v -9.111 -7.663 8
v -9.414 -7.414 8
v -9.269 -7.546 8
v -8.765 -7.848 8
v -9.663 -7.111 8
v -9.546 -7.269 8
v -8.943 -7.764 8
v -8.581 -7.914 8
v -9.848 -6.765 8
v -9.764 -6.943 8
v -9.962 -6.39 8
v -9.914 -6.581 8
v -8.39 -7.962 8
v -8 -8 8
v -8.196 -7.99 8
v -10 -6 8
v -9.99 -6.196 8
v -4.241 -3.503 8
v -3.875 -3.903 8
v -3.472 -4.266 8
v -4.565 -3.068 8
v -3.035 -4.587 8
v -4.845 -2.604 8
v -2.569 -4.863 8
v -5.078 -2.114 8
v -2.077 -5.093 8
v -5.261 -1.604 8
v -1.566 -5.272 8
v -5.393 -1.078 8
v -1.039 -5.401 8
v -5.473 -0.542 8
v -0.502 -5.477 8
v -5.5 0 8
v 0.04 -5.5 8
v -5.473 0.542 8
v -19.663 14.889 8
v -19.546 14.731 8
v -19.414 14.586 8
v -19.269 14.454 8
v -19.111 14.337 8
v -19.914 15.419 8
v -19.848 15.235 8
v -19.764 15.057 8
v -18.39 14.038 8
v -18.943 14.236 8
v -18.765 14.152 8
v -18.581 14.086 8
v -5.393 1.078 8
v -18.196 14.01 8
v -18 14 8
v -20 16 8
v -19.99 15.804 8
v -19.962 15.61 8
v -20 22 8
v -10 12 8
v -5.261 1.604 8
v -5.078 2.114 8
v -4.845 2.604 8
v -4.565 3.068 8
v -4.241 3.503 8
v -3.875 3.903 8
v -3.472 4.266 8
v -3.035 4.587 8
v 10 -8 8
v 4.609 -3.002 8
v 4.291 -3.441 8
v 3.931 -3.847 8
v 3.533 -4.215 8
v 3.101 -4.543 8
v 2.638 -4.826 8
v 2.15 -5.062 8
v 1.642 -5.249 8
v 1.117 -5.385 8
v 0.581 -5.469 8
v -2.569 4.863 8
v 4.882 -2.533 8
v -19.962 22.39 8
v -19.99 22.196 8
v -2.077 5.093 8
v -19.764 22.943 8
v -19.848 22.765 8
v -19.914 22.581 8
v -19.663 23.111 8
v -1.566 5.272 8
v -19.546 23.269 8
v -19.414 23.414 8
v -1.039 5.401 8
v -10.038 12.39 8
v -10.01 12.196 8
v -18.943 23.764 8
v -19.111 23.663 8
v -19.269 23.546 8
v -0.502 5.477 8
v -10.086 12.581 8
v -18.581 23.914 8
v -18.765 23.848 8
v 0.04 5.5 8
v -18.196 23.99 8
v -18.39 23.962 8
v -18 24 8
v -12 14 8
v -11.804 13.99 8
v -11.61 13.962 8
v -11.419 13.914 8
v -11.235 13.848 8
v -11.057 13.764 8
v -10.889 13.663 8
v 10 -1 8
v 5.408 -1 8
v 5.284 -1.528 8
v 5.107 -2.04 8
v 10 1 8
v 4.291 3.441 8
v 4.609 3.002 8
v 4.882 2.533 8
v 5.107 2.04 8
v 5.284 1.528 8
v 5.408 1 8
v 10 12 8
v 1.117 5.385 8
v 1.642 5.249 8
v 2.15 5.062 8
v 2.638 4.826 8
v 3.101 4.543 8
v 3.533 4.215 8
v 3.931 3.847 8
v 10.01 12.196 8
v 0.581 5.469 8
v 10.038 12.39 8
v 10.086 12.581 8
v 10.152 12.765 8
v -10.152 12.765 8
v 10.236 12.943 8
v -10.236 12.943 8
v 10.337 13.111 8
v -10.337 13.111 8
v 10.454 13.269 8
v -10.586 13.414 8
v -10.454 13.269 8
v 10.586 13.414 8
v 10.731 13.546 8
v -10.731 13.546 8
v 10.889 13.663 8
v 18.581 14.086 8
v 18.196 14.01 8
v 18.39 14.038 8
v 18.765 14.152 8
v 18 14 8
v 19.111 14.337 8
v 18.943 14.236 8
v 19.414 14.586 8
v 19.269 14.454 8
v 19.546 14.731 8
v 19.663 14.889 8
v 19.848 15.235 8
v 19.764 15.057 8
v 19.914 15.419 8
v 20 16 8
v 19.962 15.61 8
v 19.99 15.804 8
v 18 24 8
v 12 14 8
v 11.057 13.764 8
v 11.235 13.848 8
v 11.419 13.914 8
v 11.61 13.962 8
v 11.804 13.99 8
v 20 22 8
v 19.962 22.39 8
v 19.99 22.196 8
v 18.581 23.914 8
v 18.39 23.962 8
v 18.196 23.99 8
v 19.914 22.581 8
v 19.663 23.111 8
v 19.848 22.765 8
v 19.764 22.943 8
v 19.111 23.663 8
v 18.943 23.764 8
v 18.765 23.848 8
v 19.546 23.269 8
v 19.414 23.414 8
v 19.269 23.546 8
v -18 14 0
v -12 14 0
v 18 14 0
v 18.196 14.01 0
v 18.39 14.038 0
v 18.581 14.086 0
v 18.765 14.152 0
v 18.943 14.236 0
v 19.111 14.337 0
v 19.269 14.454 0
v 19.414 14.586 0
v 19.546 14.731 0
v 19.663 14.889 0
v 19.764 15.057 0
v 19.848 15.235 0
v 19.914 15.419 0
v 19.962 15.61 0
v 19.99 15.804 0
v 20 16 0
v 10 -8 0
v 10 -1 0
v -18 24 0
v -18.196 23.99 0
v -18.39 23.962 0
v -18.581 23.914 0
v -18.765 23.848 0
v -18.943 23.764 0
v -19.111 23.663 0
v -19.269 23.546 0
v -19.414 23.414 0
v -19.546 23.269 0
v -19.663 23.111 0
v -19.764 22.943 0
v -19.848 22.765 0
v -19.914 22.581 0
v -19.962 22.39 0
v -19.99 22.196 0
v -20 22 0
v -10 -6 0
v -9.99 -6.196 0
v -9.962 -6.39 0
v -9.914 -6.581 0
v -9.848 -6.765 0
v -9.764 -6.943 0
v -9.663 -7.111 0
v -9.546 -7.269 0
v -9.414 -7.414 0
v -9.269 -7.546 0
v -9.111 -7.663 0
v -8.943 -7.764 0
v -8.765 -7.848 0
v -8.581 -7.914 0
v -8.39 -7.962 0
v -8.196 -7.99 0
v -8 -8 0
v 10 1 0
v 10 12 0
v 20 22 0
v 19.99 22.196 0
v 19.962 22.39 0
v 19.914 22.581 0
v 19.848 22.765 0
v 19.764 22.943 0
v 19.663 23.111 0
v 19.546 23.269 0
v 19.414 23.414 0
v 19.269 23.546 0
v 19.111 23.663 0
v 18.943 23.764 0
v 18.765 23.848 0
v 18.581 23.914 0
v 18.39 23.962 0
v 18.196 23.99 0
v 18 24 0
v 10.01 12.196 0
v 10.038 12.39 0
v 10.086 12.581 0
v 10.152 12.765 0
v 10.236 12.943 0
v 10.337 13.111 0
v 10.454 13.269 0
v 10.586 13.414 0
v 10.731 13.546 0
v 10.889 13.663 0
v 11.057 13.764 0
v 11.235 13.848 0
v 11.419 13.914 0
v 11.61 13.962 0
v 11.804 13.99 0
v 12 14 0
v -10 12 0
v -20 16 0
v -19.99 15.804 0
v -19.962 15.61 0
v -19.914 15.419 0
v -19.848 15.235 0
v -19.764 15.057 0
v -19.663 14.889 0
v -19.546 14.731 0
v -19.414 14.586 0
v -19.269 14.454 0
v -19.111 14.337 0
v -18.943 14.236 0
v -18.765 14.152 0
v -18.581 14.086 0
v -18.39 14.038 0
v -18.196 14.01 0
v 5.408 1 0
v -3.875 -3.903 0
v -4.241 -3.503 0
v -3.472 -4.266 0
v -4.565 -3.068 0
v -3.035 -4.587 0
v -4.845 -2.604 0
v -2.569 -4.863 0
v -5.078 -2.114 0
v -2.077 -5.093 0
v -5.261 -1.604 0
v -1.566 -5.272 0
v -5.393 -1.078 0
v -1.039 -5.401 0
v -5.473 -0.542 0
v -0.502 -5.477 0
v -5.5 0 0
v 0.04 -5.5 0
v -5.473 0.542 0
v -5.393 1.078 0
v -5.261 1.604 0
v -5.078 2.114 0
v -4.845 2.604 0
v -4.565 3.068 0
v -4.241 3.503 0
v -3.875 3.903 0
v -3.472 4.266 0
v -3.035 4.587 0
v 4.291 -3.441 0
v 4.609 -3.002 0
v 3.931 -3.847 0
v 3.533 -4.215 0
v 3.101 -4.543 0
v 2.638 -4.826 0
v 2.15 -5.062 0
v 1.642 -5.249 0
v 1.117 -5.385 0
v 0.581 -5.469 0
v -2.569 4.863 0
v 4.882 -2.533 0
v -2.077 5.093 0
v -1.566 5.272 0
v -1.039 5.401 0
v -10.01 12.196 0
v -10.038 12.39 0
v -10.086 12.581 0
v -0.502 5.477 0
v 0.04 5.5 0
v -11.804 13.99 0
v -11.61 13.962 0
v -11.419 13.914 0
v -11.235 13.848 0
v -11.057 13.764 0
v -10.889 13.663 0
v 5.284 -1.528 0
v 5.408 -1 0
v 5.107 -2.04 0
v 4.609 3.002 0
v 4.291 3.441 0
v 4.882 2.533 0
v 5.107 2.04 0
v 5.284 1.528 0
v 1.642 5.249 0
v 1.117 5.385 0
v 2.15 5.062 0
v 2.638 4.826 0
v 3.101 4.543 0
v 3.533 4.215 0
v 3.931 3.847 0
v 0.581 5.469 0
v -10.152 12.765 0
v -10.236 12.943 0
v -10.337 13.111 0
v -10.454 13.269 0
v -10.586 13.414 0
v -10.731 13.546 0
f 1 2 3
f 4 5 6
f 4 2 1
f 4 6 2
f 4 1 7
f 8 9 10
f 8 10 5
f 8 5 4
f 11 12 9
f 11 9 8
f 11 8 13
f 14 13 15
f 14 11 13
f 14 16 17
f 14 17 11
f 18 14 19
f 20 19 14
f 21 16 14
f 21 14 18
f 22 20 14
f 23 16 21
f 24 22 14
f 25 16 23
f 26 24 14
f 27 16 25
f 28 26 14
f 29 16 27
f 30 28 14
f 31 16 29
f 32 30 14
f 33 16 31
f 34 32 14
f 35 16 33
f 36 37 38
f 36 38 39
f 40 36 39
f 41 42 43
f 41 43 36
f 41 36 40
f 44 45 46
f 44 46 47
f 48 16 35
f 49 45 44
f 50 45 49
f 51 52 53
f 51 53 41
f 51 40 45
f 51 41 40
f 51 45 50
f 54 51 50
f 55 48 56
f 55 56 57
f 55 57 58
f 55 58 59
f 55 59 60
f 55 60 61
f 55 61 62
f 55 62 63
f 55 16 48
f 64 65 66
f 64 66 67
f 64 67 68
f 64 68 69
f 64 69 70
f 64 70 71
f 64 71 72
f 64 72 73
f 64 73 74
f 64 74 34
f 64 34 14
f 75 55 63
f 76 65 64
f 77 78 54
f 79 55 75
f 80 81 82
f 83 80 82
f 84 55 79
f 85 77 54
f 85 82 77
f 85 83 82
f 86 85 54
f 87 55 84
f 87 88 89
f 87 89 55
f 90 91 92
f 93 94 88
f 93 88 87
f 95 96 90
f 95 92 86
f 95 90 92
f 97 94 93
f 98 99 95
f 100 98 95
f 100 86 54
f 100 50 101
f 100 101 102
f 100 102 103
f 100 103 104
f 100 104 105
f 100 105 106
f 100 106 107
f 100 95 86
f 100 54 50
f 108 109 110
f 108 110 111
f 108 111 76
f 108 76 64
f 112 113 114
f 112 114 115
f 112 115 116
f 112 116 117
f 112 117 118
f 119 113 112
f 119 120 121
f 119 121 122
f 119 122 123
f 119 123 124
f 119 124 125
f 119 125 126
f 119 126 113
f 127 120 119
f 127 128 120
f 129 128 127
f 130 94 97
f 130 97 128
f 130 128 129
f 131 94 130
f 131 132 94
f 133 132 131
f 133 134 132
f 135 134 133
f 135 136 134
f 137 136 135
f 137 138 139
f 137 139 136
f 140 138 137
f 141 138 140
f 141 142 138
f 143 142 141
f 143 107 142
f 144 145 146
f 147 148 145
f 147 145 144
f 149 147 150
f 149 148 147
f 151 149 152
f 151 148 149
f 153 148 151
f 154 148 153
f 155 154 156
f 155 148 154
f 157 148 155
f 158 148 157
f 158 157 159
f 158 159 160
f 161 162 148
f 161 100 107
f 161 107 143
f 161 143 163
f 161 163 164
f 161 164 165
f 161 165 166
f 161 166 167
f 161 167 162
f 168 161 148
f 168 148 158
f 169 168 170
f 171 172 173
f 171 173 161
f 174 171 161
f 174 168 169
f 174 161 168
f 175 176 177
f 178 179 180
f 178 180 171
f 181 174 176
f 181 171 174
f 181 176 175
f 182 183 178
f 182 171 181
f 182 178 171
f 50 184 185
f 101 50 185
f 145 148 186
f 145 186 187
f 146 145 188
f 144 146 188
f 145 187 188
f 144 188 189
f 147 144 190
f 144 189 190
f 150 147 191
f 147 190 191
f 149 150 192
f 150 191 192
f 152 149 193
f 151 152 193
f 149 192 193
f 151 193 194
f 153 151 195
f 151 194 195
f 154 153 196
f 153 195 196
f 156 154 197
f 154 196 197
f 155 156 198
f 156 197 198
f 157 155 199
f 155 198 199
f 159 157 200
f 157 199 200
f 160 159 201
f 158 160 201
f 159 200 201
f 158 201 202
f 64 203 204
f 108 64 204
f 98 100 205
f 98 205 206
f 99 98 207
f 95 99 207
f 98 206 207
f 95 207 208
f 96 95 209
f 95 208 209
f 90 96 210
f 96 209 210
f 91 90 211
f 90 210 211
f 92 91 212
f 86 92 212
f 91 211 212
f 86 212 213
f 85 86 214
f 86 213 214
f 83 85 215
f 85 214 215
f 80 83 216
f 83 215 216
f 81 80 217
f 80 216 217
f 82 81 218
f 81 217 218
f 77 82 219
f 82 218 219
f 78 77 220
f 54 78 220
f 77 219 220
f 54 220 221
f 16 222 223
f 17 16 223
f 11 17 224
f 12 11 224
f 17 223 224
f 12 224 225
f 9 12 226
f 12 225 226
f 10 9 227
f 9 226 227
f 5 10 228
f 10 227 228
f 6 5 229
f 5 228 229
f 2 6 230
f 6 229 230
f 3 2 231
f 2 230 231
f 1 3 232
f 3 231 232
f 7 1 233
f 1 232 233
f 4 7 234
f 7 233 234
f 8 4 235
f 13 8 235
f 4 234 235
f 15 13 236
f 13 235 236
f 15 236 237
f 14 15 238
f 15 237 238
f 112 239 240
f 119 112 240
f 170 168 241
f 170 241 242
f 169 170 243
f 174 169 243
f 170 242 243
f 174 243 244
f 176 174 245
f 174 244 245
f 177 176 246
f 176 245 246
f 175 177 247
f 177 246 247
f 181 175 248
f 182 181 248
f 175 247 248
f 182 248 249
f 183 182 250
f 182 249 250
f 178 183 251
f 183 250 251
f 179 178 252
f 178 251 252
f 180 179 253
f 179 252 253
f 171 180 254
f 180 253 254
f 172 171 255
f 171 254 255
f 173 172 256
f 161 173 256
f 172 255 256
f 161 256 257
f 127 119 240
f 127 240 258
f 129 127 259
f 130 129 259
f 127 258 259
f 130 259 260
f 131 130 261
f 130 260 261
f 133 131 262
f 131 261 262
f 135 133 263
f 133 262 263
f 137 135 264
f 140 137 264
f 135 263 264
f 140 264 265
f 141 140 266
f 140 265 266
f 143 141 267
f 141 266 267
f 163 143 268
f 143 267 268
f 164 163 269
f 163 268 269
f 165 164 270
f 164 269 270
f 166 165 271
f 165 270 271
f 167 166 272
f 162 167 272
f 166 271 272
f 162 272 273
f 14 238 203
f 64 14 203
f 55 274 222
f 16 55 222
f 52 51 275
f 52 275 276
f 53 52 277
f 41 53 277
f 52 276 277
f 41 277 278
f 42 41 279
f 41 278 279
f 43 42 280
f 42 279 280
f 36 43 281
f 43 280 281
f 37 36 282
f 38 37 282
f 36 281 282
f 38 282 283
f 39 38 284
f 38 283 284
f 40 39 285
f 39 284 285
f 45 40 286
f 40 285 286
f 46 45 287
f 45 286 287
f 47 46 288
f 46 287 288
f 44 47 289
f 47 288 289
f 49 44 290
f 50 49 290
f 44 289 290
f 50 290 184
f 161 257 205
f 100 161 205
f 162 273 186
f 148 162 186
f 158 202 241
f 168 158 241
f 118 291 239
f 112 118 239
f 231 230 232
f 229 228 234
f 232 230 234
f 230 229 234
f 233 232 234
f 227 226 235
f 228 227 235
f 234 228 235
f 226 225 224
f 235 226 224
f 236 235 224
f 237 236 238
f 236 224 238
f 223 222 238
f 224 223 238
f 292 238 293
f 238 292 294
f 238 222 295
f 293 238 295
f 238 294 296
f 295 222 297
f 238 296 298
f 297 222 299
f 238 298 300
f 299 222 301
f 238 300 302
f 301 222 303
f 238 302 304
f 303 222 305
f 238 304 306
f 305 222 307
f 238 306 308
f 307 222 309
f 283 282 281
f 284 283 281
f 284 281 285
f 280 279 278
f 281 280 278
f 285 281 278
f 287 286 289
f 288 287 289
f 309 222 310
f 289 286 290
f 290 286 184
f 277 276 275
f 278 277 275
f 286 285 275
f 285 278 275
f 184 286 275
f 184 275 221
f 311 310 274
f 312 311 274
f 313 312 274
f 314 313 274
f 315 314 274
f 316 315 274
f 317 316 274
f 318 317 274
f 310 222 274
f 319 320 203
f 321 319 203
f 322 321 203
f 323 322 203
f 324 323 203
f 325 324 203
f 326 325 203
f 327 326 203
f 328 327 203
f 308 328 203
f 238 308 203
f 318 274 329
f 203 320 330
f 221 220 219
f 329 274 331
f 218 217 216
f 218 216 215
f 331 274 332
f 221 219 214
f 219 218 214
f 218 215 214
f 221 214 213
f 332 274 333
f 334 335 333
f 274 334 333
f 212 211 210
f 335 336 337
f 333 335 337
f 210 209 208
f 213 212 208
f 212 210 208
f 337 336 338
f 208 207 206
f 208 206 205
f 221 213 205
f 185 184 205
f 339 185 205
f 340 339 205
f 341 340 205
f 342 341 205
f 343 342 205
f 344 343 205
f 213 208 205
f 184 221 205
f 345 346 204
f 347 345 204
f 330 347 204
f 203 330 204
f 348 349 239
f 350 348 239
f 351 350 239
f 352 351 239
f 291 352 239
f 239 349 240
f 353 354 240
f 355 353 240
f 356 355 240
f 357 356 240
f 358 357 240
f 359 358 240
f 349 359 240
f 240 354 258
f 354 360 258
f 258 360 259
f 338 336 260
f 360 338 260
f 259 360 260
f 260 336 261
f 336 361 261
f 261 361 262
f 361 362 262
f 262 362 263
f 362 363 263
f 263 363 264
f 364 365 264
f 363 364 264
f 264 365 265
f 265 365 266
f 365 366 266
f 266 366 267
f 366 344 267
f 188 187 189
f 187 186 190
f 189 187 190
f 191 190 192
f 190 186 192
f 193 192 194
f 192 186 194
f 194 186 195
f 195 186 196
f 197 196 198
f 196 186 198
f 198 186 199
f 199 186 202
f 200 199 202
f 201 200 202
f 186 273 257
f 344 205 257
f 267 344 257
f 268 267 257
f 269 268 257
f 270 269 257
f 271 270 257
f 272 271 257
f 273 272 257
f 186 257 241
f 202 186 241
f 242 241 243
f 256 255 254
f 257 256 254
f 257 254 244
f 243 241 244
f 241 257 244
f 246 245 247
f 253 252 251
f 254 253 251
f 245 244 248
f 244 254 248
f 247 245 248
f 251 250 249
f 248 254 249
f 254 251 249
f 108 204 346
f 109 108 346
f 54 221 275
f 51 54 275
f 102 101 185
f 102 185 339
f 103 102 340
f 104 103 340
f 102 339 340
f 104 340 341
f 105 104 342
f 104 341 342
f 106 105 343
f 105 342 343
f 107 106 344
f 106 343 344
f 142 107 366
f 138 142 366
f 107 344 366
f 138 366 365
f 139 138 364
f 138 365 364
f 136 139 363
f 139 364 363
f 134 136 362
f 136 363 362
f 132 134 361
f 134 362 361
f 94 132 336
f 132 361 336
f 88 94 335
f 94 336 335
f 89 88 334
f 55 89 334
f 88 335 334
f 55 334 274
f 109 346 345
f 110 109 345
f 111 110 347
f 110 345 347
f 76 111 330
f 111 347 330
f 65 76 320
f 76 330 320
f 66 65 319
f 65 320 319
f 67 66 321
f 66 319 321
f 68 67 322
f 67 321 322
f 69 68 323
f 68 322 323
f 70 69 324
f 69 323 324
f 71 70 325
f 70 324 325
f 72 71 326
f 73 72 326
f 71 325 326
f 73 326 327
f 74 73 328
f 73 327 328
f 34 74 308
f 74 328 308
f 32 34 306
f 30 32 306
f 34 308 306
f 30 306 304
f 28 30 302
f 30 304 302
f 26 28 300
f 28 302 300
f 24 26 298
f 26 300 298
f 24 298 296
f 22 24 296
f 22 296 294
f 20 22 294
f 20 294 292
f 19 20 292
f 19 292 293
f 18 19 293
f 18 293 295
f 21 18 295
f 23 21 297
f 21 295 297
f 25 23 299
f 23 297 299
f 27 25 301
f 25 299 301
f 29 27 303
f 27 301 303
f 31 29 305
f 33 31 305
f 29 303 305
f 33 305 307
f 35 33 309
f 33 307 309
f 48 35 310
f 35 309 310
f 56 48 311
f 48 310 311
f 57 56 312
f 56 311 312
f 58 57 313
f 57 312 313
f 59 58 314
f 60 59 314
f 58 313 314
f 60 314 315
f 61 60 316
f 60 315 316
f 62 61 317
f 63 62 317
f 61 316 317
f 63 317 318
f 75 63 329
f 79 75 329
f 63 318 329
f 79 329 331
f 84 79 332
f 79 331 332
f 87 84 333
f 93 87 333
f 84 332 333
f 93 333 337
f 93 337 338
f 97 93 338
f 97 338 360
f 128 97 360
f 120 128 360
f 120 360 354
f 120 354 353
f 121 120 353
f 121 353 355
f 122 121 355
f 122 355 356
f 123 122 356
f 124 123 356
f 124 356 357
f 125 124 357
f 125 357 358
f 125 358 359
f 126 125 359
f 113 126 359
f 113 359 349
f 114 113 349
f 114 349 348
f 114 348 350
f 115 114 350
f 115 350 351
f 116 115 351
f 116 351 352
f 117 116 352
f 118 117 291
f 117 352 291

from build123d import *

# Parameters (mm, degrees)
BOSS_EXTRUDE1_DEPTH = 8


with BuildPart() as part:
    # Sketch1 → Boss-Extrude1 (new body)
    with BuildSketch(Plane.XY):
        with BuildLine():
            Line((12, 14), (18, 14))
            ThreePointArc((18, 14), (19.414213562, 14.585786438), (20, 16))
            Line((20, 16), (20, 22))
            ThreePointArc((20, 22), (19.414213562, 23.414213562), (18, 24))
            Line((18, 24), (-18, 24))
            ThreePointArc((-18, 24), (-19.414213562, 23.414213562), (-20, 22))
            Line((-20, 22), (-20, 16))
            ThreePointArc((-20, 16), (-19.414213562, 14.585786438), (-18, 14))
            Line((-18, 14), (-12, 14))
            ThreePointArc((-12, 14), (-10.585786438, 13.414213562), (-10, 12))
            Line((-10, 12), (-10, -6))
            ThreePointArc((-10, -6), (-9.414213562, -7.414213562), (-8, -8))
            Line((-8, -8), (10, -8))
            Line((10, -8), (10, -1))
            Line((10, -1), (5.408326913, -1))
            ThreePointArc((5.408326913, -1), (-5.5, 0), (5.408326913, 1))
            Line((5.408326913, 1), (10, 1))
            Line((10, 1), (10, 12))
            ThreePointArc((10, 12), (10.585786438, 13.414213562), (12, 14))
        make_face()
    extrude(amount=BOSS_EXTRUDE1_DEPTH)


solid = part.part
